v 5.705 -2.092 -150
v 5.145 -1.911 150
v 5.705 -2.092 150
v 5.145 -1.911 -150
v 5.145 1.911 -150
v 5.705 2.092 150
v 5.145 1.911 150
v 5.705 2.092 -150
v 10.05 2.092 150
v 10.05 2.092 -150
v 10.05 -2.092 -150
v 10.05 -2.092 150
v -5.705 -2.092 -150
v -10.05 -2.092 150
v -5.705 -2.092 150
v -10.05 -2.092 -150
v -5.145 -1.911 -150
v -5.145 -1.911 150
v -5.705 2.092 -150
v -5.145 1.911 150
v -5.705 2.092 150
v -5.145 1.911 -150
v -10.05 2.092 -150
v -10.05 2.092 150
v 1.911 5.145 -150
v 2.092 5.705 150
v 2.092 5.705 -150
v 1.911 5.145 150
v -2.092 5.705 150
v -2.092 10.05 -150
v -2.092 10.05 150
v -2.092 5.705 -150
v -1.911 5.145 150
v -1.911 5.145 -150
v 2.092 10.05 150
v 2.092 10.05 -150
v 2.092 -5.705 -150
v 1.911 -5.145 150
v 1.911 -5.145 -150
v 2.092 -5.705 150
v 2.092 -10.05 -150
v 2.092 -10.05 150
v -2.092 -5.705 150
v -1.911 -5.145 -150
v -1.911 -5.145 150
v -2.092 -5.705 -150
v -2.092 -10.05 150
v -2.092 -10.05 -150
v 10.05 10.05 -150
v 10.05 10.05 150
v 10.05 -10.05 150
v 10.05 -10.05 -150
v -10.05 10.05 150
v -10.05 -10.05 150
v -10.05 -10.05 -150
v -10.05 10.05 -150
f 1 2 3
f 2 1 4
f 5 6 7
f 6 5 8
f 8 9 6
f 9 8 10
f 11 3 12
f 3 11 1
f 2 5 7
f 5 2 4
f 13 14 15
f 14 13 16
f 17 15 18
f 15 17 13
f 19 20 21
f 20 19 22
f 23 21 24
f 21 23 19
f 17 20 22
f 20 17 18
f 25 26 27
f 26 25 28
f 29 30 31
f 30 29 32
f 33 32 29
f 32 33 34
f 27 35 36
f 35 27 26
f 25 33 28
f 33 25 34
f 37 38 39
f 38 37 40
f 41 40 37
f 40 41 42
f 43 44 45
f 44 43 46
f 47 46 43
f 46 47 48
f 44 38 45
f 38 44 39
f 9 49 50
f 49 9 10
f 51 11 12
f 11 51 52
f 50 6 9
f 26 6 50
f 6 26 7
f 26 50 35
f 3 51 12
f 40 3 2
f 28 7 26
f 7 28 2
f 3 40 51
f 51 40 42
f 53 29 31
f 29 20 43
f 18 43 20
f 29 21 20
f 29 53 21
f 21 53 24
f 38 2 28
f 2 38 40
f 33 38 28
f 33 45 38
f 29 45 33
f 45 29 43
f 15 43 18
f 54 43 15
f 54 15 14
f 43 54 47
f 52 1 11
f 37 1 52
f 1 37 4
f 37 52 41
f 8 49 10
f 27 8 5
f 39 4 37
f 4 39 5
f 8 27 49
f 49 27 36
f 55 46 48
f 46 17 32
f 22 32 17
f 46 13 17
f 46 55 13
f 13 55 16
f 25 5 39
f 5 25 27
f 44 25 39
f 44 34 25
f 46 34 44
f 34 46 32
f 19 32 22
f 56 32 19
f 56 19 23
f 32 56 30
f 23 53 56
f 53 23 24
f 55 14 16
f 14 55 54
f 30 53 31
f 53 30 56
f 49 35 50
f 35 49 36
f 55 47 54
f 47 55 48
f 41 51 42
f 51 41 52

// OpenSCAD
// Misumi Beam
module misumibeam(size1=15, size2=15, length=100, extra=0.1) {
   difference() {
      cube([size1+extra, size2+extra, length], center=true);
      for (a = [0:180:180]) rotate([0, 0, a]) {
         translate([size1/2, 0, 0]) {
          //  % cube([size1/2, 3, length+1], center=true);
			minkowski() {
               cube([size1/2-(extra+1), size1/6-extra, length+1], center=true);
               cylinder(r=0.5, h=1, center=true);
			} 
        }
      }
      for (a = [0:90:270]) rotate([0, 0, a]) {
         translate([size2/2, 0, 0]) {
          //  % cube([size1/2, 3, length+1], center=true);
			minkowski() {
               cube([size1/2-(extra+1), size1/6-extra, length+1], center=true);
               cylinder(r=0.5, h=1, center=true);
			} 
        }
      }
   }
}

# misumibeam(20, 20, 300);
